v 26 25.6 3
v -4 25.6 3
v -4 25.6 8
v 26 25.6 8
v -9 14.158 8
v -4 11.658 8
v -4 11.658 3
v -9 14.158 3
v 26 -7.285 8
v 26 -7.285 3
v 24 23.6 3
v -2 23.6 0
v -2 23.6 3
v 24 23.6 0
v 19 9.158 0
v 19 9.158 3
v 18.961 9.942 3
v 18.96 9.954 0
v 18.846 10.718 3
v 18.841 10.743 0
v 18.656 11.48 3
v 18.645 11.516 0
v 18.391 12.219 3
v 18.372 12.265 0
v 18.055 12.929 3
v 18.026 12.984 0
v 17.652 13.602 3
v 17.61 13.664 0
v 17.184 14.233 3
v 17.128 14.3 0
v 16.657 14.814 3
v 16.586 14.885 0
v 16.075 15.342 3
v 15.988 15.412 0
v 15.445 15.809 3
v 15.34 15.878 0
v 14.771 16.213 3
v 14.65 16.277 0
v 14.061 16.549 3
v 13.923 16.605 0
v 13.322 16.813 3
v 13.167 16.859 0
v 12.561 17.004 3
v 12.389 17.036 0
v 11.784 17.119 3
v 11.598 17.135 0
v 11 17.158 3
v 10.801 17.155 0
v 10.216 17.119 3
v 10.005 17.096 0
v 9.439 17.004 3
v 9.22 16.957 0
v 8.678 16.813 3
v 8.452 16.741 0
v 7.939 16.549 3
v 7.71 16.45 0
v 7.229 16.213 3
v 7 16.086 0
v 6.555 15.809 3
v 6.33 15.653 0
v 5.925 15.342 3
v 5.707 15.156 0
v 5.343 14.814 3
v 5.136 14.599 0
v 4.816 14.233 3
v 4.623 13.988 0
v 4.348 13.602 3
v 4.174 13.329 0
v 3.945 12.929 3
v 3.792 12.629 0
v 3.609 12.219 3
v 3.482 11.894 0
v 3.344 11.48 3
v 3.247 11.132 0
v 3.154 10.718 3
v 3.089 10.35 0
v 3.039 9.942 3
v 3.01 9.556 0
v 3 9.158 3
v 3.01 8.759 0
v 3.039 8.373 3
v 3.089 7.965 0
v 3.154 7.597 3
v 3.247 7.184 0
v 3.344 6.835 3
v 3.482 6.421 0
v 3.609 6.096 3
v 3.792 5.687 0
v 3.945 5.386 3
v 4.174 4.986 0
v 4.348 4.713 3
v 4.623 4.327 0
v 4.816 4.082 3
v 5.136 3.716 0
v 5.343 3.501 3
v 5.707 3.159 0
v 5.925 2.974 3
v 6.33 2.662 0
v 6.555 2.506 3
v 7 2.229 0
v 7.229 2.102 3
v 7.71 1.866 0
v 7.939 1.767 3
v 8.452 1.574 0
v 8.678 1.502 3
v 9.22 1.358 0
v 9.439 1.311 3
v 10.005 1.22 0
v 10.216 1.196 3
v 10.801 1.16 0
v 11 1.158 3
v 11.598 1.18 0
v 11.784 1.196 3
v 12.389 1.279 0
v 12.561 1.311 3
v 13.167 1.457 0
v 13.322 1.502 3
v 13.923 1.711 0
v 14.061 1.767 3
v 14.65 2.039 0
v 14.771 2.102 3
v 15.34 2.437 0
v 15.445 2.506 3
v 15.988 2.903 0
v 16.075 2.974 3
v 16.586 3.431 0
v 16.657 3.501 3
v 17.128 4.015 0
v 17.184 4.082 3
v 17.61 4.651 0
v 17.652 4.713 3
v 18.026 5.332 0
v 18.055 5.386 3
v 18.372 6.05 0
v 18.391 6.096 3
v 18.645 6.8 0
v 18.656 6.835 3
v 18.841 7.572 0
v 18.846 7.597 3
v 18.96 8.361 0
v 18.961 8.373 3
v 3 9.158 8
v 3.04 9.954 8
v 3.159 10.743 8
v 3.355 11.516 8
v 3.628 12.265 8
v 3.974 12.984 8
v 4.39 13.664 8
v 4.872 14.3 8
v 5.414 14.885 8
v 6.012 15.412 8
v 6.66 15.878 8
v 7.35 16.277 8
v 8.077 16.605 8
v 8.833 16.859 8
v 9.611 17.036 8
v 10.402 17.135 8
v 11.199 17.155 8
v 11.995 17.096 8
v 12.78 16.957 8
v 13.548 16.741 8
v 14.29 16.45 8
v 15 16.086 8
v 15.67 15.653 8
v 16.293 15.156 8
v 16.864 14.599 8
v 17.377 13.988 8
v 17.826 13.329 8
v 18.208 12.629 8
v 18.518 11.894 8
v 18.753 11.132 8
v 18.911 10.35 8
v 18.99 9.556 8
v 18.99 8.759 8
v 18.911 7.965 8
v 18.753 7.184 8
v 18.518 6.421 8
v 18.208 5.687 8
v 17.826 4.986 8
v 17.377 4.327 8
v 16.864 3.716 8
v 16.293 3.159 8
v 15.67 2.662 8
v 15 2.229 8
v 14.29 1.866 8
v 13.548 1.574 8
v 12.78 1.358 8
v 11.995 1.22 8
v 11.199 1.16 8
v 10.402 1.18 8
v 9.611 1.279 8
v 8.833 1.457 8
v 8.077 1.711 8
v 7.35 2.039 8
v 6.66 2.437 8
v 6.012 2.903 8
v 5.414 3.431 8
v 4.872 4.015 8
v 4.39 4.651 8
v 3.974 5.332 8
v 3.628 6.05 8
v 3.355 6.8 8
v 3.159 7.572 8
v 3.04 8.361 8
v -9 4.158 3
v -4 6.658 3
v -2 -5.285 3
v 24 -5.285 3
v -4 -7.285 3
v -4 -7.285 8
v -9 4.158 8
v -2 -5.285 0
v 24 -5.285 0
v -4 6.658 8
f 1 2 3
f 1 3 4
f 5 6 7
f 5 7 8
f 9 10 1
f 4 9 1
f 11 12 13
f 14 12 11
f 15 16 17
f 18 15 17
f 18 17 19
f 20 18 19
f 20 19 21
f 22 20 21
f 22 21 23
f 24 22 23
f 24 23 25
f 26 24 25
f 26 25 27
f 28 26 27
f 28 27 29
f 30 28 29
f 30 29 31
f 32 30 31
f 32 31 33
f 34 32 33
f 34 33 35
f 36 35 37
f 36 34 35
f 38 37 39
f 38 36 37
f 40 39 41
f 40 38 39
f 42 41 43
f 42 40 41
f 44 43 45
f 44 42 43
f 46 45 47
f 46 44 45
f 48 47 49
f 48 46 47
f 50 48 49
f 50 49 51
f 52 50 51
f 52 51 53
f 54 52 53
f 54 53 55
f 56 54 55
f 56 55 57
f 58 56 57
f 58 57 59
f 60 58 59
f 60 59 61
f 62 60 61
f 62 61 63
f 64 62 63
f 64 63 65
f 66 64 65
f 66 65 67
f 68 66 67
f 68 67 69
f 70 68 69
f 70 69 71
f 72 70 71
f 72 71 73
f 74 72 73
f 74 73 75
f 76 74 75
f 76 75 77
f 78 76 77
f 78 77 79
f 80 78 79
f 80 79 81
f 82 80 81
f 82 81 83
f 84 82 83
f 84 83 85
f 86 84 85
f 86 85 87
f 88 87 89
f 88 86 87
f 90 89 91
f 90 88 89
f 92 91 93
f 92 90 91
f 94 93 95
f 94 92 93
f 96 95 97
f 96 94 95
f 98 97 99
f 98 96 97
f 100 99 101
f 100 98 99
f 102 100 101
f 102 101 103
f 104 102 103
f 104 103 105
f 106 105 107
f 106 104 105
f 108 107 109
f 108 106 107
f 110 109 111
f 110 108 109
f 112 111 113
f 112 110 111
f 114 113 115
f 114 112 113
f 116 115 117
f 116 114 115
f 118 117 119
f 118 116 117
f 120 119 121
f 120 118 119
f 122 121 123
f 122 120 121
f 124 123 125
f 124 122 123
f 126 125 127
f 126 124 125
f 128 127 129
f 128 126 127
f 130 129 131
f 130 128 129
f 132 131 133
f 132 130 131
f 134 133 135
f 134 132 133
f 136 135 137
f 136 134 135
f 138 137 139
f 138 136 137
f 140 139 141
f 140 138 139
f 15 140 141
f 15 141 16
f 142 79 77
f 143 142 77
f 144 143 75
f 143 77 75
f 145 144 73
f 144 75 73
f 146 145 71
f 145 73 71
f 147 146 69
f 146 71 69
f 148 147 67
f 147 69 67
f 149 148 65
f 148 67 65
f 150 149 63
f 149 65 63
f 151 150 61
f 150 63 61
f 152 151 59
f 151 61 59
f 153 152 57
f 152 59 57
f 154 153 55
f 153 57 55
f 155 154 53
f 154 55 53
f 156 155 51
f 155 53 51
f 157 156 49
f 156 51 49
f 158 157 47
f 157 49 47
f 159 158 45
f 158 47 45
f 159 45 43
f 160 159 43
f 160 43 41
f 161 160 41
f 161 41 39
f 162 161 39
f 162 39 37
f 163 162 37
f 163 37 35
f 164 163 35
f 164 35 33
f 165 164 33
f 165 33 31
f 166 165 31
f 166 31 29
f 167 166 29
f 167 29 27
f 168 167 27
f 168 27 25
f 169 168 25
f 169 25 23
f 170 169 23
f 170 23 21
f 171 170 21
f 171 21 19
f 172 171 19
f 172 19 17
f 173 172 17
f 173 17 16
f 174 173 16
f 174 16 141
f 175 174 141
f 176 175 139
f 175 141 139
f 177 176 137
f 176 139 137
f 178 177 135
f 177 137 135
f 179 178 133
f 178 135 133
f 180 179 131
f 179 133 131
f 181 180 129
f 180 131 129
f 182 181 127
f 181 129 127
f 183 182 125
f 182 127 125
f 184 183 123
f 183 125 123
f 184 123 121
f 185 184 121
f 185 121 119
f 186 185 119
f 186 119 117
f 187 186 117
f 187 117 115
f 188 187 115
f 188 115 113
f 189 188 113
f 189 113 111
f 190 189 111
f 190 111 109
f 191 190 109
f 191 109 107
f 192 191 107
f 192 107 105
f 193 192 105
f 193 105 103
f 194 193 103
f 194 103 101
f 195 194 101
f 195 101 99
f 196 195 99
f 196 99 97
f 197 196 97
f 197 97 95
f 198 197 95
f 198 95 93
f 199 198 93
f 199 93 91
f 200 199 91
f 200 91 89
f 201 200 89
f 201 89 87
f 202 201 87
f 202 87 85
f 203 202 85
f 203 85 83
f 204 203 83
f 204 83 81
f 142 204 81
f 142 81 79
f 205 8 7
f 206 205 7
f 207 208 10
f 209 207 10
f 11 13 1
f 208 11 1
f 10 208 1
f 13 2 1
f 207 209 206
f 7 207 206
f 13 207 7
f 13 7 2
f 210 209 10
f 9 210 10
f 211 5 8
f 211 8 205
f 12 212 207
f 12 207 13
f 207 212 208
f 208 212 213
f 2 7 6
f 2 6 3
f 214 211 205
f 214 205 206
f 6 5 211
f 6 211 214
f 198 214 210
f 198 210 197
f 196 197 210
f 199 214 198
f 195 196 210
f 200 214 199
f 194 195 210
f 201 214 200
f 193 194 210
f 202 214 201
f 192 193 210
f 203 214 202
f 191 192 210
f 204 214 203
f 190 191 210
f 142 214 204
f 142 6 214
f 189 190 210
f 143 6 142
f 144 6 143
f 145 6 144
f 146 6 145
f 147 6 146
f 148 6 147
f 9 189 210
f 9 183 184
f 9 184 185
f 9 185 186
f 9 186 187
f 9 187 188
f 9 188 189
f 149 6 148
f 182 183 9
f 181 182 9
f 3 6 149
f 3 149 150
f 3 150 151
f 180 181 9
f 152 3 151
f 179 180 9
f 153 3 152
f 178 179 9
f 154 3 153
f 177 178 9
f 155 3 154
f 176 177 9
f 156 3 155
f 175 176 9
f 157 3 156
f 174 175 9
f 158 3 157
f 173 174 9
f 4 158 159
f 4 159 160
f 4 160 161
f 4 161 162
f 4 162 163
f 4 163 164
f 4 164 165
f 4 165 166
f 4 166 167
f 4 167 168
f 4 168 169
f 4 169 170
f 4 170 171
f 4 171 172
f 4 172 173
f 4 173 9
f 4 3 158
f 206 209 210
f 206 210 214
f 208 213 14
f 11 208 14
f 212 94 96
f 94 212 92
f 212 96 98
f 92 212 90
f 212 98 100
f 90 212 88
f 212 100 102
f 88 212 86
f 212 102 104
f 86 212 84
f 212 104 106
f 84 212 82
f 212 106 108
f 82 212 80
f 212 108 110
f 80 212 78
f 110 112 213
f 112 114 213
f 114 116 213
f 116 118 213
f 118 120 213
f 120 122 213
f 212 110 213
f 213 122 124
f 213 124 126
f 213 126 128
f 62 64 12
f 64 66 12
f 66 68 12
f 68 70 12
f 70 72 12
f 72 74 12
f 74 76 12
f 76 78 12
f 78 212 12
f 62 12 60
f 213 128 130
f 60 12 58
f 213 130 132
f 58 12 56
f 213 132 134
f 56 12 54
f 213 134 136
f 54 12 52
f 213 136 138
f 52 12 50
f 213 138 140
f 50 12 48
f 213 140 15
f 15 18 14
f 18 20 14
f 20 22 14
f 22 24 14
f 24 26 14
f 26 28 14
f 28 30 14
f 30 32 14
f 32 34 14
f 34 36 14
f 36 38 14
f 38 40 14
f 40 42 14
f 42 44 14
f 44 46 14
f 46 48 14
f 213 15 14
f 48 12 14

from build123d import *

# Parameters (mm, degrees)
CROQUIS1_W              = 26
CROQUIS1_H              = 28.884781413
CROQUIS1_R              = 8
SALIENTE_EXTRUIR1_DEPTH = 3
CROQUIS2_W              = 30
CROQUIS2_H              = 32.884781413
SALIENTE_EXTRUIR2_DEPTH = 5
SALIENTE_EXTRUIR3_DEPTH = 5
CROQUIS5_R              = 8
CORTAR_EXTRUIR1_DEPTH   = 10


with BuildPart() as part:
    # Croquis1 → Saliente-Extruir1 (new body)
    with BuildSketch(Plane.XY):
        with Locations((11, 9.157609294)):
            Rectangle(CROQUIS1_W, CROQUIS1_H)
        with Locations((11, 9.157609293)):
            Circle(CROQUIS1_R, mode=Mode.SUBTRACT)
    extrude(amount=SALIENTE_EXTRUIR1_DEPTH)

    # Croquis2 → Saliente-Extruir2 (add)
    with BuildSketch(Plane.XY.offset(3)):
        with Locations((11, 9.157609294)):
            Rectangle(CROQUIS2_W, CROQUIS2_H)
    extrude(amount=SALIENTE_EXTRUIR2_DEPTH)

    # Croquis4 → Saliente-Extruir3 (add)
    with BuildSketch(Plane.XY.offset(8)):
        Polygon((-9, 14.157609293), (-9, 4.157609293), (-4, 6.657609293), (-4, 11.657609293), align=None)
    extrude(amount=-SALIENTE_EXTRUIR3_DEPTH)

    # Croquis5 → Cortar-Extruir1 (cut)
    with BuildSketch(Plane(origin=(0, 0, 3), x_dir=(-1, 0, 0), z_dir=(0, 0, -1))):
        with Locations((-11, 9.157609293)):
            Circle(CROQUIS5_R)
    extrude(amount=-CORTAR_EXTRUIR1_DEPTH, mode=Mode.SUBTRACT)


solid = part.part
